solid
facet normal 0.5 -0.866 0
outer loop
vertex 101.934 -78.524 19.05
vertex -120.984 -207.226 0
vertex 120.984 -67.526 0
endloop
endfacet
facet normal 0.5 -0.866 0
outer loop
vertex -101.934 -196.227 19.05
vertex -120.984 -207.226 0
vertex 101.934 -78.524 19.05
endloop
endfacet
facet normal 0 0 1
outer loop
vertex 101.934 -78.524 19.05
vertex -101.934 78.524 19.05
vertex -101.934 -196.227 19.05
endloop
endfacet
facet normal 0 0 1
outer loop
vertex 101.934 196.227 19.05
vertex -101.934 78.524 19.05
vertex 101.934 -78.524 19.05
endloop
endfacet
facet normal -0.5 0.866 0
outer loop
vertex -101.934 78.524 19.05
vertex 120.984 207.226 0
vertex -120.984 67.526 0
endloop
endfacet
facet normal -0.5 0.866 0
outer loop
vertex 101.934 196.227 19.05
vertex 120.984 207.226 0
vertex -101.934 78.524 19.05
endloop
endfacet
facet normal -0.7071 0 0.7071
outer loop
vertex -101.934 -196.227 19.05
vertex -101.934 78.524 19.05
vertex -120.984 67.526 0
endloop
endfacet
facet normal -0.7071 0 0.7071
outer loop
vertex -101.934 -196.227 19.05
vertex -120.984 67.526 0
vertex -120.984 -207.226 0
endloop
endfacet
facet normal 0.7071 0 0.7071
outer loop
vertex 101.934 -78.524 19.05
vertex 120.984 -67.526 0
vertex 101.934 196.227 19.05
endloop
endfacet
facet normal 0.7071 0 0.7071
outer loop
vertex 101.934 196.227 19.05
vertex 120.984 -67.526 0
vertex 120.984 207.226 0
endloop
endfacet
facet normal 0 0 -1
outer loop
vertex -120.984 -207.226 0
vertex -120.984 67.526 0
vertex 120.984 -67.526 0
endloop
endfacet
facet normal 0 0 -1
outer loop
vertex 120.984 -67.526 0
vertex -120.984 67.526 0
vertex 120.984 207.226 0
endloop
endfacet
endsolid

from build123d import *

# Parameters (mm, degrees)
F1_DEPTH = 19.05
F2_SIZE  = 19.04999
F3_SIZE  = 19.04999


# Not quite as in the source:
# - a fillet or chamfer is up to 0.001 mm smaller than in the source, because OpenCascade refuses the exact size


with BuildPart() as f1:
    # F0 (on Top) → F1 (new body)
    with BuildSketch(Plane.XY):
        Polygon((-120.9837489087, -207.2259), (120.9837489087, -67.5259), (120.9837489087, 207.2259), (-120.9837489087, 67.5259), align=None)
    extrude(amount=F1_DEPTH)

    # F2 (size 19.05 in the source; OpenCascade refuses exactly that, so slightly less here)
    f2_edges = [f1.edges().sort_by_distance(p)[0] for p in [
        (-120.983749, -69.85, 19.05),
    ]]
    chamfer(f2_edges, length=F2_SIZE)

    # F3 (size 19.05 in the source; OpenCascade refuses exactly that, so slightly less here)
    f3_edges = [f1.edges().sort_by_distance(p)[0] for p in [
        (120.983749, 69.85, 19.05),
    ]]
    chamfer(f3_edges, length=F3_SIZE)


solid = f1.part
